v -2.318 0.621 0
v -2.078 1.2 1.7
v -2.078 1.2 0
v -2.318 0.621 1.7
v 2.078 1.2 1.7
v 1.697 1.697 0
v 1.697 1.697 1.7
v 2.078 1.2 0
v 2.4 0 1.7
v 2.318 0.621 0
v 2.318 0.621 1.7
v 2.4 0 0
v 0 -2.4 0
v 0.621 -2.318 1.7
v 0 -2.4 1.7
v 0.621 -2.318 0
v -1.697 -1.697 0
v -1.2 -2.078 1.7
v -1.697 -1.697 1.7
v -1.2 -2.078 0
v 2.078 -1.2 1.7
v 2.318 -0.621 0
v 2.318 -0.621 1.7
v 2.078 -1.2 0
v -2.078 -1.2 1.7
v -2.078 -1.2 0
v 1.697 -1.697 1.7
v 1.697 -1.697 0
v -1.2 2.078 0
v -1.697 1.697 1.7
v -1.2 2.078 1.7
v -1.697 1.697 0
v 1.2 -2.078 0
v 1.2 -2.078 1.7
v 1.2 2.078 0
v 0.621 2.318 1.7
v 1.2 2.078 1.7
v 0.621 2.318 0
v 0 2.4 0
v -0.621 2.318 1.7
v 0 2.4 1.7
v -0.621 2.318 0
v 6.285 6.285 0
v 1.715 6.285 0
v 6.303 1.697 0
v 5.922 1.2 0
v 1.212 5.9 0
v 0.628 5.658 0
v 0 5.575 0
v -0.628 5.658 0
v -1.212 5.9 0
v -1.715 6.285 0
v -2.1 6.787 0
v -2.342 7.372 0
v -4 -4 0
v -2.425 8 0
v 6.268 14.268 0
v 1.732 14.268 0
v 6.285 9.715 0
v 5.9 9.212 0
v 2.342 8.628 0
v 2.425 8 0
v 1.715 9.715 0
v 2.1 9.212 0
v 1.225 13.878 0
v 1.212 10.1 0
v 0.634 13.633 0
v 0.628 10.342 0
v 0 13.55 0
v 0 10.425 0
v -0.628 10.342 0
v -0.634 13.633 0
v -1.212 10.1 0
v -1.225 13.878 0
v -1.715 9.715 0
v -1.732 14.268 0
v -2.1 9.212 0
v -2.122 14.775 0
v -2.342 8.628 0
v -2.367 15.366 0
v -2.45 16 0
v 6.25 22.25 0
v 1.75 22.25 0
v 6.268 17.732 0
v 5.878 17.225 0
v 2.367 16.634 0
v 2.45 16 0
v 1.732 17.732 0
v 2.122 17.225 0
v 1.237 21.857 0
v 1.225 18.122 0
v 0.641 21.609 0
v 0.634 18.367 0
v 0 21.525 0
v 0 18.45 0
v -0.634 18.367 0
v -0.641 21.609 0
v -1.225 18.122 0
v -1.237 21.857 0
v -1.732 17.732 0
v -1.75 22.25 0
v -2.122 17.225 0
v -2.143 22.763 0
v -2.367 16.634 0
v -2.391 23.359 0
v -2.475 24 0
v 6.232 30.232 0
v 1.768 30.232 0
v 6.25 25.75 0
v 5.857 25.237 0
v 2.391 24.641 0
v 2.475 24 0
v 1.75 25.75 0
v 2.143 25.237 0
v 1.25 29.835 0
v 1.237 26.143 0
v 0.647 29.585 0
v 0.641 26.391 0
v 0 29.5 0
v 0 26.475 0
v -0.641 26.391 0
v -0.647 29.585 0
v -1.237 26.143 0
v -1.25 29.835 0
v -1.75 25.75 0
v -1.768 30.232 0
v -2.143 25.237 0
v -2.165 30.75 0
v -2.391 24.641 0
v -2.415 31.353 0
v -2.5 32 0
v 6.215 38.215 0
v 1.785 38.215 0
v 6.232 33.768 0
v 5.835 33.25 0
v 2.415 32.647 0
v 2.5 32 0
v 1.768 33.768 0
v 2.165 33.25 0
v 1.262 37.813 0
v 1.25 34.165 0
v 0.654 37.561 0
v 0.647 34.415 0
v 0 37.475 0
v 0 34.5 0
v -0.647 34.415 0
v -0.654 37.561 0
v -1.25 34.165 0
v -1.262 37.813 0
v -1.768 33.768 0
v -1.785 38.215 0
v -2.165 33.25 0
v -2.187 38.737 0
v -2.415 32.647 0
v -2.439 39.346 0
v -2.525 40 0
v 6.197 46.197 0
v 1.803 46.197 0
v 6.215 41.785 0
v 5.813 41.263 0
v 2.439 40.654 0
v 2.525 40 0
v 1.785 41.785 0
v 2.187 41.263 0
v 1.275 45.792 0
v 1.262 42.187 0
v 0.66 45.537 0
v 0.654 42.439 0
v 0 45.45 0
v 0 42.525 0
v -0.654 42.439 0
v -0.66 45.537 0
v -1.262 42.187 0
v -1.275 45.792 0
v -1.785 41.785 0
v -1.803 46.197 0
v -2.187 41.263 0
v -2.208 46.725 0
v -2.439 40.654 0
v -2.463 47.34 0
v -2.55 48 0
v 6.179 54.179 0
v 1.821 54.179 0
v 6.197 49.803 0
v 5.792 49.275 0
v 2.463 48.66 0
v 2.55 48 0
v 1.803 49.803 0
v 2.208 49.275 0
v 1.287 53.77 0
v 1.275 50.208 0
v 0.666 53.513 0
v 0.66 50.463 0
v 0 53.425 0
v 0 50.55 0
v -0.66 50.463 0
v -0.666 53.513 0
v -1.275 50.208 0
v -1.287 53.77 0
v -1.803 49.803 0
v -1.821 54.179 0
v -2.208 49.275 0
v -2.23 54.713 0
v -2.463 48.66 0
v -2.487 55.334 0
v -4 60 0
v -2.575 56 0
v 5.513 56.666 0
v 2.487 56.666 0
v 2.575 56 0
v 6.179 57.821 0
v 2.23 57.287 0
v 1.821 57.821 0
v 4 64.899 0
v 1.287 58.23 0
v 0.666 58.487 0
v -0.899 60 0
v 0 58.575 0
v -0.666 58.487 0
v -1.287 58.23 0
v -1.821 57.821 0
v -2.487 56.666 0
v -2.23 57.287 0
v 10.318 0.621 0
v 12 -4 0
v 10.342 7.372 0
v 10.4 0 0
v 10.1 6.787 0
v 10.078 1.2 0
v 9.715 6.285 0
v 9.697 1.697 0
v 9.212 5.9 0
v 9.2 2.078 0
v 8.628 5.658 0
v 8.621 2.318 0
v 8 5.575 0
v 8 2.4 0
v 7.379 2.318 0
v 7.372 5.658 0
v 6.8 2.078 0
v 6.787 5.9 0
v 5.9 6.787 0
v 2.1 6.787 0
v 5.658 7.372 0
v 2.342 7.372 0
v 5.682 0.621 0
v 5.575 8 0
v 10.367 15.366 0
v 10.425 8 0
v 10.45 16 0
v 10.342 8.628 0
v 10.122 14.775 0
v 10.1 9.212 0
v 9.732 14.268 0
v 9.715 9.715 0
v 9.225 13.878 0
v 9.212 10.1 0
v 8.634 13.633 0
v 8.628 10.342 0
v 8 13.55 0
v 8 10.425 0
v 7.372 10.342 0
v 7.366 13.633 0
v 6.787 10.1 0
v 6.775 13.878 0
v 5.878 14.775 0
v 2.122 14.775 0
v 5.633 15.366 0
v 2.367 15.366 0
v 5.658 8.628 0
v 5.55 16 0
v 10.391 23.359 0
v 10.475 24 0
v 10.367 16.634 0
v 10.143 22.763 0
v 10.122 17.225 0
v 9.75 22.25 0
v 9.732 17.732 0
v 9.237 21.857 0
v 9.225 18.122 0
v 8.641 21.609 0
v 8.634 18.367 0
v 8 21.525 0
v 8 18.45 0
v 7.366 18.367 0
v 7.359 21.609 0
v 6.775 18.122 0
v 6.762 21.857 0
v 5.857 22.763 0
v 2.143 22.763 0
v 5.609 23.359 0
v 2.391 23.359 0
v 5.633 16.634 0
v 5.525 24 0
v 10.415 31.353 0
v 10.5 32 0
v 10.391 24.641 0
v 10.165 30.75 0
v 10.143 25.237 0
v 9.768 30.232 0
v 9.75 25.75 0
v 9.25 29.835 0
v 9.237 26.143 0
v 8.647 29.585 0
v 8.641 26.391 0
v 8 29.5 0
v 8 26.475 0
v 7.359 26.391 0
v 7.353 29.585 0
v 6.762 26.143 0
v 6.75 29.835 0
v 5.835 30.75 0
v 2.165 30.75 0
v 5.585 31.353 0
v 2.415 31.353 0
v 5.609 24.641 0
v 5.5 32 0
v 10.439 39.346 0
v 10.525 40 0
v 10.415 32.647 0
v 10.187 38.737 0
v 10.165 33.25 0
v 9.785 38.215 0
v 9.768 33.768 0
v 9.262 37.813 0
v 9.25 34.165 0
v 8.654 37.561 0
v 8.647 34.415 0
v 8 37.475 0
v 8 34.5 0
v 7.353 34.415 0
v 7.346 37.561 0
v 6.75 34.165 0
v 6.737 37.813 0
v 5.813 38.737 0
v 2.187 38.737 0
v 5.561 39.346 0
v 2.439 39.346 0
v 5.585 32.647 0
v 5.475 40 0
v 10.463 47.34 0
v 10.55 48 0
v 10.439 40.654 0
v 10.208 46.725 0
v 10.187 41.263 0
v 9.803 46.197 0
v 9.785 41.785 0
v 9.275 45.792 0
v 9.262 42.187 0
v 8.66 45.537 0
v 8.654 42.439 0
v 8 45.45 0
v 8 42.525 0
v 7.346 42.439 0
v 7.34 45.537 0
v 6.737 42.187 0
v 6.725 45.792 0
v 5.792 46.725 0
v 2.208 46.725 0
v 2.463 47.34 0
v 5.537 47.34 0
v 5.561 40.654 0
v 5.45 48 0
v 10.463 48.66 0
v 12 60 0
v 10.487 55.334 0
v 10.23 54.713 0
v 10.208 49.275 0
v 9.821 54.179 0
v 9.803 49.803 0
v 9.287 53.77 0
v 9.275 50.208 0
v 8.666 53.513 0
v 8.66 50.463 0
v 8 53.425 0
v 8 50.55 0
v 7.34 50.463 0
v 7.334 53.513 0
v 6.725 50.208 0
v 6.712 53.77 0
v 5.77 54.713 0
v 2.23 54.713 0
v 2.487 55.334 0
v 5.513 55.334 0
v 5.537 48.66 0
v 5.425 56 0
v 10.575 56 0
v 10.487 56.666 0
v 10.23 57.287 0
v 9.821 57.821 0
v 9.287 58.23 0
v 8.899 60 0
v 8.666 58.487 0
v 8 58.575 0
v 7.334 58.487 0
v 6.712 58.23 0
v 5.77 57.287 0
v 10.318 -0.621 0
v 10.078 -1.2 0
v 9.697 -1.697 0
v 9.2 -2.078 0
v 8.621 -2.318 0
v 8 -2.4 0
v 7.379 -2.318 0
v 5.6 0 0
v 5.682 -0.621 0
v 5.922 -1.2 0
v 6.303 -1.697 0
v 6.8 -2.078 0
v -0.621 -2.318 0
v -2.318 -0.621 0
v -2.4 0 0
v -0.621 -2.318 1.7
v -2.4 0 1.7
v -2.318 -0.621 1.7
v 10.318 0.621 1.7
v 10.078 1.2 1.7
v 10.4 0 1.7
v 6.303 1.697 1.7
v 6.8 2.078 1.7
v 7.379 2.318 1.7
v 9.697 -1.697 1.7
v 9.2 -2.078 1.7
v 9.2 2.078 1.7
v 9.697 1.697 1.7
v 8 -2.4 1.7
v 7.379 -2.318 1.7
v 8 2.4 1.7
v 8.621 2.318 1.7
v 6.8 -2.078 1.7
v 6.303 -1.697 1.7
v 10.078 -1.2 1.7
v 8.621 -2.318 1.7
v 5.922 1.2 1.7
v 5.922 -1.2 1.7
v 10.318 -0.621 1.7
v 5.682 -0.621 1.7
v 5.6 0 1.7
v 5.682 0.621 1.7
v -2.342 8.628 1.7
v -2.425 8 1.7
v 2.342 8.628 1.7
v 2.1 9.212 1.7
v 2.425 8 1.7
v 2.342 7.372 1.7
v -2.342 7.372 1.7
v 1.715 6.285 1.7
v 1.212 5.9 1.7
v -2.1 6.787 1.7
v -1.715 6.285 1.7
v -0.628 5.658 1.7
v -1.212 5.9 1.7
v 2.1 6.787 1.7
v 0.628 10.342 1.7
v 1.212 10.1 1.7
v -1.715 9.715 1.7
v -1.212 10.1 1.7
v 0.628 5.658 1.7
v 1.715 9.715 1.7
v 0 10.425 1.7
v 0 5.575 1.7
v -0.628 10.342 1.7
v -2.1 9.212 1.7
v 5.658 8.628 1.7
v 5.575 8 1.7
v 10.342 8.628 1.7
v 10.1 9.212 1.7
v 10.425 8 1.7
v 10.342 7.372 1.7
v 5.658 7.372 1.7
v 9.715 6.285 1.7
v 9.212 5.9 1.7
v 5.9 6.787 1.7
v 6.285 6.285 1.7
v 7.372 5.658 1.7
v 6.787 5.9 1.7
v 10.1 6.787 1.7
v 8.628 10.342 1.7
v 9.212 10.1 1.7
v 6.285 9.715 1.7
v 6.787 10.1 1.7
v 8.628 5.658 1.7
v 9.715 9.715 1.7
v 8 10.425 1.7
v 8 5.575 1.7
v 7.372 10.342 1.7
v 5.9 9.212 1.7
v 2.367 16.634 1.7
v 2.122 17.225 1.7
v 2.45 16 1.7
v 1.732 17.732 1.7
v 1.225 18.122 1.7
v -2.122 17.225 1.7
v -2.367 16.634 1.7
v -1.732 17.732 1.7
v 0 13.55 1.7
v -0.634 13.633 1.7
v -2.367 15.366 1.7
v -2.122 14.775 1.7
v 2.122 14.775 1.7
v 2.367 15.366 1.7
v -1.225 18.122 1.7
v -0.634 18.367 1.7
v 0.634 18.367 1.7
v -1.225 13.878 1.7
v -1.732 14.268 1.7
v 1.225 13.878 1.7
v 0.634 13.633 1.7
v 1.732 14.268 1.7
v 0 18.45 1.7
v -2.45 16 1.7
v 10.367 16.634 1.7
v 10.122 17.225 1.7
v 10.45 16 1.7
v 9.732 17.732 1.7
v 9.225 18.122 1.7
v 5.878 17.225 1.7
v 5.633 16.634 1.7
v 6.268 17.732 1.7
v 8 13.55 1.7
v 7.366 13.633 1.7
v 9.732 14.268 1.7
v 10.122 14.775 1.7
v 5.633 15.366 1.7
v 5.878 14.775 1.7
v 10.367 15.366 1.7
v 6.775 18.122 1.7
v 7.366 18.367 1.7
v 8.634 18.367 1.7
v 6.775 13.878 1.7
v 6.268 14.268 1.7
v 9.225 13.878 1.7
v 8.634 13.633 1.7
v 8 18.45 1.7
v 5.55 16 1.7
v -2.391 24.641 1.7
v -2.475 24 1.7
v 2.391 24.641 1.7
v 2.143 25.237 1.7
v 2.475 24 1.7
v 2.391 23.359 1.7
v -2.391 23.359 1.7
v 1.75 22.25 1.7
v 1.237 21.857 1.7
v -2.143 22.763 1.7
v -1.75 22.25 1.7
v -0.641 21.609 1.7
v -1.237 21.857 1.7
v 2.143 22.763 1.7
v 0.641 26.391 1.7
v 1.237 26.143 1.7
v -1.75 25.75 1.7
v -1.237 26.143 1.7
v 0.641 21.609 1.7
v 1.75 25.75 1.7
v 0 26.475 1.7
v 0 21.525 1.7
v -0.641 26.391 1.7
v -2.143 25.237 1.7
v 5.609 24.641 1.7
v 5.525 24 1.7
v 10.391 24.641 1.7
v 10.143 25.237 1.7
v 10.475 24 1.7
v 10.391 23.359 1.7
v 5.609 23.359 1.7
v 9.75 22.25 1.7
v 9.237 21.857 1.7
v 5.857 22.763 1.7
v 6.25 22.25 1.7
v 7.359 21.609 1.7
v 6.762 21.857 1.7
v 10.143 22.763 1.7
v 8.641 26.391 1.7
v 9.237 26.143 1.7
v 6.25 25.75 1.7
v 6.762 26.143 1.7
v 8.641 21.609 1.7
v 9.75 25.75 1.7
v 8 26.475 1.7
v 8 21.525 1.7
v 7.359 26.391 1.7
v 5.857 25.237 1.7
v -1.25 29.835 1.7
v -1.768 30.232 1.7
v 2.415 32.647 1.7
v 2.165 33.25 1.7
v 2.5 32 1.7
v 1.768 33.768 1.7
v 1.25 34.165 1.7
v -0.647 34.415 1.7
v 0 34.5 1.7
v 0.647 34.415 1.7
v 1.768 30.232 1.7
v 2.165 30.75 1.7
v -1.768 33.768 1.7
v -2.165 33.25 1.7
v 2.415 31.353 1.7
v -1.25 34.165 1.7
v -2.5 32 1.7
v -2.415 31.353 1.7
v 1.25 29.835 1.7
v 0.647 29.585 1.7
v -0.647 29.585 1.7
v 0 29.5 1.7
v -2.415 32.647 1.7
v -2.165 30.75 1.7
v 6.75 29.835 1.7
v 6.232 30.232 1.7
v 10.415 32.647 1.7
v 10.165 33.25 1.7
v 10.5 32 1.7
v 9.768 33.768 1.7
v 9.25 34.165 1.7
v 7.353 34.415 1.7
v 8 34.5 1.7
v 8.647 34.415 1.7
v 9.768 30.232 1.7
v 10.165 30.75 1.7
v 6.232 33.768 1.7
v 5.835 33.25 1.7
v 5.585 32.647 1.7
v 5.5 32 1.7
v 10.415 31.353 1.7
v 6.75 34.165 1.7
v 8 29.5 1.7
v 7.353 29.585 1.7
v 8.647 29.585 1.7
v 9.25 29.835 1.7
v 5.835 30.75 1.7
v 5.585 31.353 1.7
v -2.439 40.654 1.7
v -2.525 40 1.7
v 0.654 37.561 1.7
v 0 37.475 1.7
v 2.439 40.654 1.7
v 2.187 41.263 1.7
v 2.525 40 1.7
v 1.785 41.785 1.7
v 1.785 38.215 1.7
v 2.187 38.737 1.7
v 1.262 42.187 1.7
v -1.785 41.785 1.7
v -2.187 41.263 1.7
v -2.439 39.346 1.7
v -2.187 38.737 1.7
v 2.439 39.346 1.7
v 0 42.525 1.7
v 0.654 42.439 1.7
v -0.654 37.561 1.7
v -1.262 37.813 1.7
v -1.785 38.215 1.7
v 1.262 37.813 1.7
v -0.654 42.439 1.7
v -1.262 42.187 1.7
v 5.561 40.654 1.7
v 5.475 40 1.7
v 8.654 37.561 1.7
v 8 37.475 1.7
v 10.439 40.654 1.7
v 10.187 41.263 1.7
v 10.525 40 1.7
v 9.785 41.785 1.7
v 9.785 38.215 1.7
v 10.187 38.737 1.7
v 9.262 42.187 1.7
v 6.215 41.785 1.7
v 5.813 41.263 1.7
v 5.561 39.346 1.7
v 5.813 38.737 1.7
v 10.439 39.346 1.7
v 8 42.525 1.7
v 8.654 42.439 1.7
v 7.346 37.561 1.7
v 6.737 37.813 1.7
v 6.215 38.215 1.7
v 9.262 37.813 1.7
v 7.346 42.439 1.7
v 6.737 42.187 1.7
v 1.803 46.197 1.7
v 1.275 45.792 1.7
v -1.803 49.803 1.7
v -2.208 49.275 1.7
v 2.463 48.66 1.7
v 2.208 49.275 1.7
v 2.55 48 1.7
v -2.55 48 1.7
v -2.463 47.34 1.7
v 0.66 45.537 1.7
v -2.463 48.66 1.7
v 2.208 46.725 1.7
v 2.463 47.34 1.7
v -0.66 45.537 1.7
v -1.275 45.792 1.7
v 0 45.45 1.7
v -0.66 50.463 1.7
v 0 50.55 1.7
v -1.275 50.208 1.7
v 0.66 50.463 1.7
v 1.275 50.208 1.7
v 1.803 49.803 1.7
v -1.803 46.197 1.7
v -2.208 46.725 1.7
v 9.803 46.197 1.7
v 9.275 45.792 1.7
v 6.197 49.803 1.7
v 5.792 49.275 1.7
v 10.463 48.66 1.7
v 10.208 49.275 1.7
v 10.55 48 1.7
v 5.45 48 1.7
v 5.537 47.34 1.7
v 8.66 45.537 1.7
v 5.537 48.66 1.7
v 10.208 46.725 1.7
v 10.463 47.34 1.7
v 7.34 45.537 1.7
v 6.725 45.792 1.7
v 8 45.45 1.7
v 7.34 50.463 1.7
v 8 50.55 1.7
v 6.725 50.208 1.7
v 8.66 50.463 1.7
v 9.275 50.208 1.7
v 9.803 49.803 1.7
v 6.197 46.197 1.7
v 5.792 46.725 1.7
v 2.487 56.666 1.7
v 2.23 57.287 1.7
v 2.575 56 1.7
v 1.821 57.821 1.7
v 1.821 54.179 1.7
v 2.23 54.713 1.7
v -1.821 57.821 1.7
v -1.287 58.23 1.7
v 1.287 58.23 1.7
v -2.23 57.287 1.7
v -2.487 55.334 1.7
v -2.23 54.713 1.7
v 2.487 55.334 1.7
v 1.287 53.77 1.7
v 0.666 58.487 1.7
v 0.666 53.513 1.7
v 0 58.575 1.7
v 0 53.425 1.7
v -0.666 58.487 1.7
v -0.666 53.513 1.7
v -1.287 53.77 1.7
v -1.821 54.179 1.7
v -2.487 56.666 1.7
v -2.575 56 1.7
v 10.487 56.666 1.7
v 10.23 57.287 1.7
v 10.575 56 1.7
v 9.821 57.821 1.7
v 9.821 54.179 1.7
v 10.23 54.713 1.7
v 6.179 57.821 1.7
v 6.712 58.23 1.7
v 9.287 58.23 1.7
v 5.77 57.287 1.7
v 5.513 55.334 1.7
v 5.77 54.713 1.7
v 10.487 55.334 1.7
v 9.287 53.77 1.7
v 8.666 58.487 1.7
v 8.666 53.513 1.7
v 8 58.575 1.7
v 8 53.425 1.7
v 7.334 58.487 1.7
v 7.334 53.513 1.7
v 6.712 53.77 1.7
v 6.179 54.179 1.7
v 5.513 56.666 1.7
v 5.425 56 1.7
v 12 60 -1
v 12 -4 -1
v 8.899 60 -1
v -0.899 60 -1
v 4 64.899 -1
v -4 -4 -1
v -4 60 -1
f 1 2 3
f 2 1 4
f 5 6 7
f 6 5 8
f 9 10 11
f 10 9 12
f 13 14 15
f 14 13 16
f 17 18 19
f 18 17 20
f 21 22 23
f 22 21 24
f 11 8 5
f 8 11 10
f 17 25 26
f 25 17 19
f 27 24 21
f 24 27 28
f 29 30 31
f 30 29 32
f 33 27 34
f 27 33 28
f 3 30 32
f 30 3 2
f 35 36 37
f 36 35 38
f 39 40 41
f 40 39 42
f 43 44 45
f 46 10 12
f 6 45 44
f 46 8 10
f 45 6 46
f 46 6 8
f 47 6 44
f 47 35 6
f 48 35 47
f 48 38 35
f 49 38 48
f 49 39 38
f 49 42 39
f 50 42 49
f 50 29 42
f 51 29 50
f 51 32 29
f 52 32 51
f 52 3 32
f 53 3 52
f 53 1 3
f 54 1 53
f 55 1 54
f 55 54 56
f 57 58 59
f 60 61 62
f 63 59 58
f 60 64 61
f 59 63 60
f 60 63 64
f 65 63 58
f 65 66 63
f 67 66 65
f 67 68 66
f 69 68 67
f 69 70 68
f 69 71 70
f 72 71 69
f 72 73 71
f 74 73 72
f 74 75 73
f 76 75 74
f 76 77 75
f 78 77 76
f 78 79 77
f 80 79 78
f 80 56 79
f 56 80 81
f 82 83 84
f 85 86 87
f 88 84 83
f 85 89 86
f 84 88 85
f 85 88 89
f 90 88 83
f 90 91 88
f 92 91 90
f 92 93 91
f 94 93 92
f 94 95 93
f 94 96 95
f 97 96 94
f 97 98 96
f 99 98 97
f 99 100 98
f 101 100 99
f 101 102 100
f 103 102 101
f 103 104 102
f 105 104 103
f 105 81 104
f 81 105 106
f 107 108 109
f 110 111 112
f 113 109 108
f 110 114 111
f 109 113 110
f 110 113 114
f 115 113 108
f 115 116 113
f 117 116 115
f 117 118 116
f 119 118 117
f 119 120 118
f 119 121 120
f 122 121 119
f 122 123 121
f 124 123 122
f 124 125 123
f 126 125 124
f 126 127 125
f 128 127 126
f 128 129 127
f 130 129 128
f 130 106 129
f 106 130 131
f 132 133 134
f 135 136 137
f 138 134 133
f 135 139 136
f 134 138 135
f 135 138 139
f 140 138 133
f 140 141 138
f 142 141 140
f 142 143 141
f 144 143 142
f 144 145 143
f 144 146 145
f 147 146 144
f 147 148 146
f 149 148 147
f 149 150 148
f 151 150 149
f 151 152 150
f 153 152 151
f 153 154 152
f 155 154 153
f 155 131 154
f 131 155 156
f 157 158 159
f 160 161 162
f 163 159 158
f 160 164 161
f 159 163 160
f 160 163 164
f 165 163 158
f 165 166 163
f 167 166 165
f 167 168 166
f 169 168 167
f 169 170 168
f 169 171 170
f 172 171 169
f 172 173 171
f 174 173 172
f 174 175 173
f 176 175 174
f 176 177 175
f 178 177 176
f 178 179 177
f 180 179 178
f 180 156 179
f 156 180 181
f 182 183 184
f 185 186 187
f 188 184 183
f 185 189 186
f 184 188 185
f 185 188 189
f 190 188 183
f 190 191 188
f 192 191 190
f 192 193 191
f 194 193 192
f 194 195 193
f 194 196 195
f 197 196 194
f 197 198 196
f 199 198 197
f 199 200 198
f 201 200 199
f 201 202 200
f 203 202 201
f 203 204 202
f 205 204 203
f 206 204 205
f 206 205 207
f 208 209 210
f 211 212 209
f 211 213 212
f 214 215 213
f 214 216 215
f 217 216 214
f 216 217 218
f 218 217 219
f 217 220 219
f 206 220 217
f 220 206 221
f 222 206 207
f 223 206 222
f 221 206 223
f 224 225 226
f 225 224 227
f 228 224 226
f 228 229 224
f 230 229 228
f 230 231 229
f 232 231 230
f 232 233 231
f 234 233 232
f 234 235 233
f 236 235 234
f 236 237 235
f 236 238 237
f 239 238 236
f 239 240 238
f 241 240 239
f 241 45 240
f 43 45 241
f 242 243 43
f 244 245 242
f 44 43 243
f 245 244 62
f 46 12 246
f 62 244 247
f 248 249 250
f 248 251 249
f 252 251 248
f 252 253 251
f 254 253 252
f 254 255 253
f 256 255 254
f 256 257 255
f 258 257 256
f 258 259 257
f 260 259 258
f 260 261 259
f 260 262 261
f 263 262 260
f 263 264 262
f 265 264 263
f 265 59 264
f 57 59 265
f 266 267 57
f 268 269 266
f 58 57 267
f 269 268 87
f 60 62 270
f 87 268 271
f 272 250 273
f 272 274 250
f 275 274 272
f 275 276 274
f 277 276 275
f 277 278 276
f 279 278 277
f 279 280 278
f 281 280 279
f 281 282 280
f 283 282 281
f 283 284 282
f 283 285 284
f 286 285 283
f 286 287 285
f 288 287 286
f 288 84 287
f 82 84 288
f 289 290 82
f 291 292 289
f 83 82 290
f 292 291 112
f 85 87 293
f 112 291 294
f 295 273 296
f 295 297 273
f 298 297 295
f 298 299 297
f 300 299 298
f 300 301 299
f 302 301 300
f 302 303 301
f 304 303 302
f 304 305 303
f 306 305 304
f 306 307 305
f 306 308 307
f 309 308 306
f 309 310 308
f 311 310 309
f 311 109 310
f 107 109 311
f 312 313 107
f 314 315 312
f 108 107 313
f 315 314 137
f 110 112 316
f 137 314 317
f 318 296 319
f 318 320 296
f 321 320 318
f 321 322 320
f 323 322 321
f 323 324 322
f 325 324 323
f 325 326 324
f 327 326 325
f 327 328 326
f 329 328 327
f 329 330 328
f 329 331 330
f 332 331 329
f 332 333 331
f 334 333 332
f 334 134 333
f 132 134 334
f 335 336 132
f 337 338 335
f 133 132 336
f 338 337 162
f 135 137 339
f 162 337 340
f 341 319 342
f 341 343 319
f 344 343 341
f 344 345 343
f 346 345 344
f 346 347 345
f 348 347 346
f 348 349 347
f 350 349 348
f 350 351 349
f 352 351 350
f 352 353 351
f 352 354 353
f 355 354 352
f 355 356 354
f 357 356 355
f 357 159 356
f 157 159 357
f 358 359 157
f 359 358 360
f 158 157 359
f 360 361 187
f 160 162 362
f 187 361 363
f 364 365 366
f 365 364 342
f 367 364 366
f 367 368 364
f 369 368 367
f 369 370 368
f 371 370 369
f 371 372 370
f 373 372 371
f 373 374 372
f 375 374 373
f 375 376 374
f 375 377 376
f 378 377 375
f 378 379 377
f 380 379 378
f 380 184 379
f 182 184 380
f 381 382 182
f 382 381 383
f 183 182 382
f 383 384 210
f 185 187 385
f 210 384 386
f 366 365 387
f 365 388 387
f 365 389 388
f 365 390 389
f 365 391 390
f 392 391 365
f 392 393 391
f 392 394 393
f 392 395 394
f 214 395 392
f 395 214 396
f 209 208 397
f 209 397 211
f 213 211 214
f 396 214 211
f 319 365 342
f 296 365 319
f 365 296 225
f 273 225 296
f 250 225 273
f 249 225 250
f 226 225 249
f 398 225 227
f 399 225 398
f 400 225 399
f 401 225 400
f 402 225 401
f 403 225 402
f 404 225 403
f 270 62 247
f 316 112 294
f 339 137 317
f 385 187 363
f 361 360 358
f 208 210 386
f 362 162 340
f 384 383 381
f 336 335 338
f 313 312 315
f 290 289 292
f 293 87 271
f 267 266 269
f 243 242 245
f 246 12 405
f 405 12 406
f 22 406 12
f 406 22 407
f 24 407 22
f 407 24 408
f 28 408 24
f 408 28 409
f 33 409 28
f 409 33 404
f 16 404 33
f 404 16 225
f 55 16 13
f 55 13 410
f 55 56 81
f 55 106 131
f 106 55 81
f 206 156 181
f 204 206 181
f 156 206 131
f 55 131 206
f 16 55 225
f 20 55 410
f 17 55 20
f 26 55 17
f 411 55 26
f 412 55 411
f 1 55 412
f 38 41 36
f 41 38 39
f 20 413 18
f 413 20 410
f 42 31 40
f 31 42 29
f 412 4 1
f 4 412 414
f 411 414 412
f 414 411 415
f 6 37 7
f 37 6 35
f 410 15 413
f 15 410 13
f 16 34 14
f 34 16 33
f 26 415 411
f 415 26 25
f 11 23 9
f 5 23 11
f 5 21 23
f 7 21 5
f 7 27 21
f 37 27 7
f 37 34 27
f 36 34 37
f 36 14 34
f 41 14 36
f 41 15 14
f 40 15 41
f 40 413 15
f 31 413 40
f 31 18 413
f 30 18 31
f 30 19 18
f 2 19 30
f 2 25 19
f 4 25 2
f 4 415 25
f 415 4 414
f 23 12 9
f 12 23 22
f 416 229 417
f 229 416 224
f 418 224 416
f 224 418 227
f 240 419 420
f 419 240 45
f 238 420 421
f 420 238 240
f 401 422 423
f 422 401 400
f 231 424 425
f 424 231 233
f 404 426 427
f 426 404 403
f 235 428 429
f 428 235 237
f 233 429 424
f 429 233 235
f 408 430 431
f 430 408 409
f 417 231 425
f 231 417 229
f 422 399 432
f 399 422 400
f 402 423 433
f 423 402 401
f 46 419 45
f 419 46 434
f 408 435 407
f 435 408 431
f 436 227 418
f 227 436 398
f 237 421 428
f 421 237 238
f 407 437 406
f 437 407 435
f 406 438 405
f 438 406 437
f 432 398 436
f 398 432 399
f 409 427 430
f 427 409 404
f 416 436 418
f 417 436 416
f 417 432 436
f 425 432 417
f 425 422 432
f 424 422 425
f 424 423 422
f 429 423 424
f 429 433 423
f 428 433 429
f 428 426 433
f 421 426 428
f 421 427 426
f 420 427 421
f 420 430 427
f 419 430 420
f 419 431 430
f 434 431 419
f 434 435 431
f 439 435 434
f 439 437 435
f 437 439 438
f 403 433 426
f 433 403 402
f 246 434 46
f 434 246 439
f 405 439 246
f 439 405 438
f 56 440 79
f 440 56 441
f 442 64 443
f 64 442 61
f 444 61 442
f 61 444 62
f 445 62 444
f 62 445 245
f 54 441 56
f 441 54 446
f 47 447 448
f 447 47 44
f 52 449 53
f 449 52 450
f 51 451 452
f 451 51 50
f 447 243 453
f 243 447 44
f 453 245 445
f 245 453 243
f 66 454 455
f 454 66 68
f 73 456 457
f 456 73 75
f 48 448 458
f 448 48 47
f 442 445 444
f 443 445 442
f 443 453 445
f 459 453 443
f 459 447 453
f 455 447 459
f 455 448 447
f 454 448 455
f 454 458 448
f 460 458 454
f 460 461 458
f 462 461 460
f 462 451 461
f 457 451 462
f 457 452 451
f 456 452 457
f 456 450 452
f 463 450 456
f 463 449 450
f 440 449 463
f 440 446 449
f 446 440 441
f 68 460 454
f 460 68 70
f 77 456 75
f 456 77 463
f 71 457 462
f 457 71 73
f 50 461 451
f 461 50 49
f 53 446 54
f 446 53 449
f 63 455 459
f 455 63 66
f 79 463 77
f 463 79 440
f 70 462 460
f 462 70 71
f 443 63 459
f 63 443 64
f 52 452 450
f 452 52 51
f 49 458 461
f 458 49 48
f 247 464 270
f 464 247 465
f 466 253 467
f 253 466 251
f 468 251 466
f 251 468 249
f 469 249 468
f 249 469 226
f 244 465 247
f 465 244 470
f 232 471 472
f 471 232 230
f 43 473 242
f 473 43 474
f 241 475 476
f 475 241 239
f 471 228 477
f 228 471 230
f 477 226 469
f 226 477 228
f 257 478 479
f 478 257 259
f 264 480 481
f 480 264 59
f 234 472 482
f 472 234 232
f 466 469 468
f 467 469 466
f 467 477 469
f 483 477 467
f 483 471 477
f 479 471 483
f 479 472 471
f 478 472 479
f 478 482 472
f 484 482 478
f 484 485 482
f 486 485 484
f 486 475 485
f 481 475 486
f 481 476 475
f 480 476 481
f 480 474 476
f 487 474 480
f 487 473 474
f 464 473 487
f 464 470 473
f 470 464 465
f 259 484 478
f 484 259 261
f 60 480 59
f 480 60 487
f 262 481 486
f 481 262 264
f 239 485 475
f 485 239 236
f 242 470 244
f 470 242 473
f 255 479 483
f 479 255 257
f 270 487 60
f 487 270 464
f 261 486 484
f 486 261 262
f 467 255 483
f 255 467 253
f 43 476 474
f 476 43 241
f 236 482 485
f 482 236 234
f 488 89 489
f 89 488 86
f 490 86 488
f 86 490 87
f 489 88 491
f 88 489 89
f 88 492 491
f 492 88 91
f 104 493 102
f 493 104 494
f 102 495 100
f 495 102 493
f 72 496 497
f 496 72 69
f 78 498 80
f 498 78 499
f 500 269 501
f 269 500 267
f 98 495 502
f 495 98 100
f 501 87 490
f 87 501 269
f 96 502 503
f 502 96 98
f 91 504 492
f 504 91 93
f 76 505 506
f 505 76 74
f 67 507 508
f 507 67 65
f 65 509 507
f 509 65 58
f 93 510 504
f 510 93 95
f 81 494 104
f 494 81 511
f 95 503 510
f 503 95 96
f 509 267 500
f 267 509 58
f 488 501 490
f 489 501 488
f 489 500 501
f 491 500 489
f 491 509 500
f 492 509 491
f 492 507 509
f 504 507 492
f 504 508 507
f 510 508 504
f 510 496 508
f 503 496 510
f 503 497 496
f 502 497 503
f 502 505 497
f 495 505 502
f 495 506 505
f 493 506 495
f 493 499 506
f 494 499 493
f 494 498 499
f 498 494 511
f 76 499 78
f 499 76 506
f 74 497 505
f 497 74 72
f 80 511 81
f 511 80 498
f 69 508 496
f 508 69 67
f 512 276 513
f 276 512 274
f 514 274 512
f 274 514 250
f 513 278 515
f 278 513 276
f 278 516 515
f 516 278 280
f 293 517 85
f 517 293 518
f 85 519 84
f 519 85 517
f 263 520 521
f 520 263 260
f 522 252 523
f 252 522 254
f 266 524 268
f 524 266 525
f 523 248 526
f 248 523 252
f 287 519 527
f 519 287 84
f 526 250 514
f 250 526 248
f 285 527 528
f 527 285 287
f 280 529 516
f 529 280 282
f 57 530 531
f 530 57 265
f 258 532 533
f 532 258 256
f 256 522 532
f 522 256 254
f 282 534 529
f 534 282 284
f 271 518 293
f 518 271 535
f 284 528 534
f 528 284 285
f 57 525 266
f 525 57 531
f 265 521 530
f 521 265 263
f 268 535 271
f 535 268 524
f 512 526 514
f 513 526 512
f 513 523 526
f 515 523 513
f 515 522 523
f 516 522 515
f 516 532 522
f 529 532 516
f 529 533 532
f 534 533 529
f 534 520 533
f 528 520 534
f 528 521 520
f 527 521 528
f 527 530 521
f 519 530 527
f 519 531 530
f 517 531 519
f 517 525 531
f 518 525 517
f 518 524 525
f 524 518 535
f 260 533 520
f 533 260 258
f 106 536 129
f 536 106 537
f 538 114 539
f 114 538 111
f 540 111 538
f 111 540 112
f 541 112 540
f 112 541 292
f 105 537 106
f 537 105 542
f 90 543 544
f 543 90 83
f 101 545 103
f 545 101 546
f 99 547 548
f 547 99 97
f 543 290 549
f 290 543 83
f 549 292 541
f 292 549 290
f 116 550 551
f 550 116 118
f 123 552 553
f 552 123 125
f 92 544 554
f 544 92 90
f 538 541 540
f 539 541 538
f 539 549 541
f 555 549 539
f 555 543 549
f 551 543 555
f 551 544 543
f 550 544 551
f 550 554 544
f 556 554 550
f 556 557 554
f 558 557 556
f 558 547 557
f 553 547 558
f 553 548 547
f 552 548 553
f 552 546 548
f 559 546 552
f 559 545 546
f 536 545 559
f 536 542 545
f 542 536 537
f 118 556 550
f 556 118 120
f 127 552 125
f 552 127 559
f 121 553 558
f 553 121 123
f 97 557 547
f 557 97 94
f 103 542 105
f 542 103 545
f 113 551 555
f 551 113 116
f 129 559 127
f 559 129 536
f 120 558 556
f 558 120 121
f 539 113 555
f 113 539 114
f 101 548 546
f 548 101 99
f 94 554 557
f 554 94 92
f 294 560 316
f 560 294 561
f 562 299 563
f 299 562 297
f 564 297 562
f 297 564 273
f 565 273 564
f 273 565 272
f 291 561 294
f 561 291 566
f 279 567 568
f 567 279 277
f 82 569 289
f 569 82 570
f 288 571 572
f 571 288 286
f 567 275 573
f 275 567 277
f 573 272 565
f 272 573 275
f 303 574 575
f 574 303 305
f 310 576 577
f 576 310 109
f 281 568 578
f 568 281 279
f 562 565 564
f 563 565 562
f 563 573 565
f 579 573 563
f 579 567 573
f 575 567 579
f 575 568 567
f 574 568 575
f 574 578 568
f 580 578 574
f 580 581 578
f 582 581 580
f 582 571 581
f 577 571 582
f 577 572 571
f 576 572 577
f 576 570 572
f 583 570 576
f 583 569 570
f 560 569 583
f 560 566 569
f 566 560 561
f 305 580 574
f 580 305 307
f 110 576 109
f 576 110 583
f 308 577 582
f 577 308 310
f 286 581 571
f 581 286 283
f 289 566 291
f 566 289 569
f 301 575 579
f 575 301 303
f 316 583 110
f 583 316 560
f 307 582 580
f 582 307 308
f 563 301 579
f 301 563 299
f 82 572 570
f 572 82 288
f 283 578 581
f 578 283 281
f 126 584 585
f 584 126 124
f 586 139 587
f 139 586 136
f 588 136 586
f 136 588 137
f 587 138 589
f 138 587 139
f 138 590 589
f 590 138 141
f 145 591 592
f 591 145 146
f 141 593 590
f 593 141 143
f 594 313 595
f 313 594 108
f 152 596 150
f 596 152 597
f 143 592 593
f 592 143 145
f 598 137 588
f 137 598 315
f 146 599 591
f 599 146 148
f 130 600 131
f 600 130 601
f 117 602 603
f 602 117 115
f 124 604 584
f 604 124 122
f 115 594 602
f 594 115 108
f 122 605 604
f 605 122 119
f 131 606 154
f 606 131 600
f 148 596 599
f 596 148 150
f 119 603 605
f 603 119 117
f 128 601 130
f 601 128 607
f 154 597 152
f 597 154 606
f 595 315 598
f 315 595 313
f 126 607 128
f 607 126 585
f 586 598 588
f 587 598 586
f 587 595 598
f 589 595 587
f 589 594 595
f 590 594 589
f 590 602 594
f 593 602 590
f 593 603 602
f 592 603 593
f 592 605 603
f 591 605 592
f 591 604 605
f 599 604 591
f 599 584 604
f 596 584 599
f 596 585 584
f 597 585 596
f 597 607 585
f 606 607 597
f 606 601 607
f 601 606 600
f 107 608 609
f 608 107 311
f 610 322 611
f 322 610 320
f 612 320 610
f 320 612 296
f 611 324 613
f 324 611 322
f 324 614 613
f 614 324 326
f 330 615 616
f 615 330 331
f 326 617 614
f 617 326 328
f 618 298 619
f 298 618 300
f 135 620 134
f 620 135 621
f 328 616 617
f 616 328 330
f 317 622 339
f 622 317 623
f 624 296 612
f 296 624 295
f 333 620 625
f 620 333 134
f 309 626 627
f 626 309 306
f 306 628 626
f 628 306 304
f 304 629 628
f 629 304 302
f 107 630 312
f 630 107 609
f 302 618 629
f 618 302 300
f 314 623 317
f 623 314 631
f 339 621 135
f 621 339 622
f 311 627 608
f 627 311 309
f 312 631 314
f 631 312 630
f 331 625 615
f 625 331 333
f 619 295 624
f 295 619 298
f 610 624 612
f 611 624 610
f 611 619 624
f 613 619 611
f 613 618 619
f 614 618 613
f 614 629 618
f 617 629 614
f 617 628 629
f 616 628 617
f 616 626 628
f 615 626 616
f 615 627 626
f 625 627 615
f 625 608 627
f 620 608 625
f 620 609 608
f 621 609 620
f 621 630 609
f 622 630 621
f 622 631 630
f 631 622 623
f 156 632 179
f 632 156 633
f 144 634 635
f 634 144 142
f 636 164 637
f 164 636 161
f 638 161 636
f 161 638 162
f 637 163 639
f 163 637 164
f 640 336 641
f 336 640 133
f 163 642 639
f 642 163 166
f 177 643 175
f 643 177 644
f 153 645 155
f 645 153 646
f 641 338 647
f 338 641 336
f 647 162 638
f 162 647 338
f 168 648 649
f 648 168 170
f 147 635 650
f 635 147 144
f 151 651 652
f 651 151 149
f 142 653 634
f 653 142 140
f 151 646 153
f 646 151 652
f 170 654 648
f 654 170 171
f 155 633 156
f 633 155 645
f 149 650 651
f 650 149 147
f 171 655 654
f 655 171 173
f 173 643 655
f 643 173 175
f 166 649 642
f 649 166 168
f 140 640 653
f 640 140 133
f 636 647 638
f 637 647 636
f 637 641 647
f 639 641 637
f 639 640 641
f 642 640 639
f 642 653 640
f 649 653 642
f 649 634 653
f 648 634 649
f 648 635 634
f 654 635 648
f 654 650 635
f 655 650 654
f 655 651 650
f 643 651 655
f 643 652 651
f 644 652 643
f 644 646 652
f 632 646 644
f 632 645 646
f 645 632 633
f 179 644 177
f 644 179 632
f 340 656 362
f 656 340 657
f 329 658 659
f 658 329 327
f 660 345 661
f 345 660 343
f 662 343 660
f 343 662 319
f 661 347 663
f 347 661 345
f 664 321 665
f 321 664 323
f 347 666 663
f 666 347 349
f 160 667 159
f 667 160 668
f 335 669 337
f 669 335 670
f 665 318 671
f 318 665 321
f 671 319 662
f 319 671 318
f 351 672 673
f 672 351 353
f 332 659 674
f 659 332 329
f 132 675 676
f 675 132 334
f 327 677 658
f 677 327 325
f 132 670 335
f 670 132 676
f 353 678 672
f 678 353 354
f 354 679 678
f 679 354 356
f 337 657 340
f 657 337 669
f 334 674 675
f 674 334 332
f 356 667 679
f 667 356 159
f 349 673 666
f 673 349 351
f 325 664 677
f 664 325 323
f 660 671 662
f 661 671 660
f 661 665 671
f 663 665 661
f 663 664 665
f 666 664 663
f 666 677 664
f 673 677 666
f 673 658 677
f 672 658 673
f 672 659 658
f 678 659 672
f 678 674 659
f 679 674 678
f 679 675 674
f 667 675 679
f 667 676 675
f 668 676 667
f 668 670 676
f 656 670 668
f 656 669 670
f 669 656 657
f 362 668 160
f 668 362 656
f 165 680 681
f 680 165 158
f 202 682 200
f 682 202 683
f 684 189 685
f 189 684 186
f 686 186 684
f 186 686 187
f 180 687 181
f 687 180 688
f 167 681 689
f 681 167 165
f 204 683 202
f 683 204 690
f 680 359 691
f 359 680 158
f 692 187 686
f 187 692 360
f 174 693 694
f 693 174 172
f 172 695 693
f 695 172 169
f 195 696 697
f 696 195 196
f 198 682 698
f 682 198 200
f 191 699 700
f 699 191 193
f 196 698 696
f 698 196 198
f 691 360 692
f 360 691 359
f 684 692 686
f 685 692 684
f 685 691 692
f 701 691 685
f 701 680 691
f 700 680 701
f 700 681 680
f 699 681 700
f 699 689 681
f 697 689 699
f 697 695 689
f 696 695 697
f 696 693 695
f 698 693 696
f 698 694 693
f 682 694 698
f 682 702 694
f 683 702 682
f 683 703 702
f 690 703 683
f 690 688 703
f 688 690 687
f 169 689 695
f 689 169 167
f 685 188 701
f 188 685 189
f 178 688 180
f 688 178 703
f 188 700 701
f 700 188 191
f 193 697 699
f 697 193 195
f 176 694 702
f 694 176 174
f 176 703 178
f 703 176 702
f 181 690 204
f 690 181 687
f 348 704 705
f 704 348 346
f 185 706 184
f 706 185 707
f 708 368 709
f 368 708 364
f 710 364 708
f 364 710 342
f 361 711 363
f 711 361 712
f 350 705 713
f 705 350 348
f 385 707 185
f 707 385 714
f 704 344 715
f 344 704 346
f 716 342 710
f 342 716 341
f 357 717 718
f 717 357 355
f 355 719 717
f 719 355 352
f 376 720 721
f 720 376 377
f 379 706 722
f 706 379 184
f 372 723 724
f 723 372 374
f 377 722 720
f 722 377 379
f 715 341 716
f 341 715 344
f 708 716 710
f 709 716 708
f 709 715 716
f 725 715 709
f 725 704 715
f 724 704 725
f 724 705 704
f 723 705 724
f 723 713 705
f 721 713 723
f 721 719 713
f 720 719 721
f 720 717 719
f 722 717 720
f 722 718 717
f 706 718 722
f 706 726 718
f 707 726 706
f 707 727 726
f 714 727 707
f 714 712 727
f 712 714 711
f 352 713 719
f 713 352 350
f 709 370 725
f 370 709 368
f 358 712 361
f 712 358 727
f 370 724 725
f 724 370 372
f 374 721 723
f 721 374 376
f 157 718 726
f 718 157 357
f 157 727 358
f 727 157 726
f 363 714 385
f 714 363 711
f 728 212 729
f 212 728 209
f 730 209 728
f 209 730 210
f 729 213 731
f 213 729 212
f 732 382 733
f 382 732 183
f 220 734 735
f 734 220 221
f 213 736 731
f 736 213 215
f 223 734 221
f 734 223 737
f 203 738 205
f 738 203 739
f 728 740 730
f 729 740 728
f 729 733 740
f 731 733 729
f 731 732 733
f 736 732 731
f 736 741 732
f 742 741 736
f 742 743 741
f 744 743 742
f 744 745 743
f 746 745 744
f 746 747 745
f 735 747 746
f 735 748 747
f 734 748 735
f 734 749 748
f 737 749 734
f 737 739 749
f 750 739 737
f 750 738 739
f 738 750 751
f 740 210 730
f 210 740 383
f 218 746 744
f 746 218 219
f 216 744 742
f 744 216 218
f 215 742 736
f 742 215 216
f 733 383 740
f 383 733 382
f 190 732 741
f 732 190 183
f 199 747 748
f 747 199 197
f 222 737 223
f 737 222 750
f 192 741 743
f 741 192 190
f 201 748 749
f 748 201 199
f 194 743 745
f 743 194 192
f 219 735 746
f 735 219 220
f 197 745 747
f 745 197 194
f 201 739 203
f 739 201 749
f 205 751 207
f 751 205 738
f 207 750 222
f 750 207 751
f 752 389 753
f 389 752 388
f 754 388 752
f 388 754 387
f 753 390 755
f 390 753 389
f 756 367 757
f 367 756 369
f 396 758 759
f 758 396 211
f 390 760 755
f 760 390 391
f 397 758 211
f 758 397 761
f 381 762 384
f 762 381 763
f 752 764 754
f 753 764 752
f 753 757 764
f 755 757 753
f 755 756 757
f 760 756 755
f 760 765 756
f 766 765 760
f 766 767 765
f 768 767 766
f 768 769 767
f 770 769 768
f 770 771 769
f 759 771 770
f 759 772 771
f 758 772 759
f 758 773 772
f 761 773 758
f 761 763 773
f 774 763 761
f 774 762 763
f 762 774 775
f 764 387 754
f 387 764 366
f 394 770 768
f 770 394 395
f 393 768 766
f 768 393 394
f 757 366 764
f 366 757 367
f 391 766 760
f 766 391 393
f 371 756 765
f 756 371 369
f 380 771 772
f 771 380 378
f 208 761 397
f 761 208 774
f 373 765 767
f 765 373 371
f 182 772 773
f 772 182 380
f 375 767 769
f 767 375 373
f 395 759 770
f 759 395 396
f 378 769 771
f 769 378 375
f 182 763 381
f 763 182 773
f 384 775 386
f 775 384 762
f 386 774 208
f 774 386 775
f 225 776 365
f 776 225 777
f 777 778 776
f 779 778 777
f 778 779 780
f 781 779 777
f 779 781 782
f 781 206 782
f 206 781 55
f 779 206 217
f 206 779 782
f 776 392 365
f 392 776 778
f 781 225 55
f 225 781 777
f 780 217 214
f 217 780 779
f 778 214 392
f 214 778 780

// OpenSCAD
// This file generates a test piece for dialing in the stud diameters for your particular printer setup
// since LEGO fit can be very finicky. The triangle is there to point to the side with the
// wider studs

studDiameterStart = 4.8;
increment = .05;
versions = 8;
studHeight = 1.7;

// calculated value
studDiameterEnd = studDiameterStart + increment * (versions - 1);

// filename to include parameters
echo(filename=str("legotest_",studDiameterStart * 100, "_to_", studDiameterEnd * 100 ));

for (i=[0:versions-1]) {
  translate([0,8*i]) cylinder(d=studDiameterStart+ i * increment, h=studHeight, $fn=24);
  translate([8,8*i])cylinder(d=studDiameterStart+ i * increment, h=studHeight,$fn=24);
}
translate([-4, -4, -1])cube([16, 8*versions,1]);
translate([4,8*(versions-1)-1, -1])rotate(45)cube([7,7,1]);
